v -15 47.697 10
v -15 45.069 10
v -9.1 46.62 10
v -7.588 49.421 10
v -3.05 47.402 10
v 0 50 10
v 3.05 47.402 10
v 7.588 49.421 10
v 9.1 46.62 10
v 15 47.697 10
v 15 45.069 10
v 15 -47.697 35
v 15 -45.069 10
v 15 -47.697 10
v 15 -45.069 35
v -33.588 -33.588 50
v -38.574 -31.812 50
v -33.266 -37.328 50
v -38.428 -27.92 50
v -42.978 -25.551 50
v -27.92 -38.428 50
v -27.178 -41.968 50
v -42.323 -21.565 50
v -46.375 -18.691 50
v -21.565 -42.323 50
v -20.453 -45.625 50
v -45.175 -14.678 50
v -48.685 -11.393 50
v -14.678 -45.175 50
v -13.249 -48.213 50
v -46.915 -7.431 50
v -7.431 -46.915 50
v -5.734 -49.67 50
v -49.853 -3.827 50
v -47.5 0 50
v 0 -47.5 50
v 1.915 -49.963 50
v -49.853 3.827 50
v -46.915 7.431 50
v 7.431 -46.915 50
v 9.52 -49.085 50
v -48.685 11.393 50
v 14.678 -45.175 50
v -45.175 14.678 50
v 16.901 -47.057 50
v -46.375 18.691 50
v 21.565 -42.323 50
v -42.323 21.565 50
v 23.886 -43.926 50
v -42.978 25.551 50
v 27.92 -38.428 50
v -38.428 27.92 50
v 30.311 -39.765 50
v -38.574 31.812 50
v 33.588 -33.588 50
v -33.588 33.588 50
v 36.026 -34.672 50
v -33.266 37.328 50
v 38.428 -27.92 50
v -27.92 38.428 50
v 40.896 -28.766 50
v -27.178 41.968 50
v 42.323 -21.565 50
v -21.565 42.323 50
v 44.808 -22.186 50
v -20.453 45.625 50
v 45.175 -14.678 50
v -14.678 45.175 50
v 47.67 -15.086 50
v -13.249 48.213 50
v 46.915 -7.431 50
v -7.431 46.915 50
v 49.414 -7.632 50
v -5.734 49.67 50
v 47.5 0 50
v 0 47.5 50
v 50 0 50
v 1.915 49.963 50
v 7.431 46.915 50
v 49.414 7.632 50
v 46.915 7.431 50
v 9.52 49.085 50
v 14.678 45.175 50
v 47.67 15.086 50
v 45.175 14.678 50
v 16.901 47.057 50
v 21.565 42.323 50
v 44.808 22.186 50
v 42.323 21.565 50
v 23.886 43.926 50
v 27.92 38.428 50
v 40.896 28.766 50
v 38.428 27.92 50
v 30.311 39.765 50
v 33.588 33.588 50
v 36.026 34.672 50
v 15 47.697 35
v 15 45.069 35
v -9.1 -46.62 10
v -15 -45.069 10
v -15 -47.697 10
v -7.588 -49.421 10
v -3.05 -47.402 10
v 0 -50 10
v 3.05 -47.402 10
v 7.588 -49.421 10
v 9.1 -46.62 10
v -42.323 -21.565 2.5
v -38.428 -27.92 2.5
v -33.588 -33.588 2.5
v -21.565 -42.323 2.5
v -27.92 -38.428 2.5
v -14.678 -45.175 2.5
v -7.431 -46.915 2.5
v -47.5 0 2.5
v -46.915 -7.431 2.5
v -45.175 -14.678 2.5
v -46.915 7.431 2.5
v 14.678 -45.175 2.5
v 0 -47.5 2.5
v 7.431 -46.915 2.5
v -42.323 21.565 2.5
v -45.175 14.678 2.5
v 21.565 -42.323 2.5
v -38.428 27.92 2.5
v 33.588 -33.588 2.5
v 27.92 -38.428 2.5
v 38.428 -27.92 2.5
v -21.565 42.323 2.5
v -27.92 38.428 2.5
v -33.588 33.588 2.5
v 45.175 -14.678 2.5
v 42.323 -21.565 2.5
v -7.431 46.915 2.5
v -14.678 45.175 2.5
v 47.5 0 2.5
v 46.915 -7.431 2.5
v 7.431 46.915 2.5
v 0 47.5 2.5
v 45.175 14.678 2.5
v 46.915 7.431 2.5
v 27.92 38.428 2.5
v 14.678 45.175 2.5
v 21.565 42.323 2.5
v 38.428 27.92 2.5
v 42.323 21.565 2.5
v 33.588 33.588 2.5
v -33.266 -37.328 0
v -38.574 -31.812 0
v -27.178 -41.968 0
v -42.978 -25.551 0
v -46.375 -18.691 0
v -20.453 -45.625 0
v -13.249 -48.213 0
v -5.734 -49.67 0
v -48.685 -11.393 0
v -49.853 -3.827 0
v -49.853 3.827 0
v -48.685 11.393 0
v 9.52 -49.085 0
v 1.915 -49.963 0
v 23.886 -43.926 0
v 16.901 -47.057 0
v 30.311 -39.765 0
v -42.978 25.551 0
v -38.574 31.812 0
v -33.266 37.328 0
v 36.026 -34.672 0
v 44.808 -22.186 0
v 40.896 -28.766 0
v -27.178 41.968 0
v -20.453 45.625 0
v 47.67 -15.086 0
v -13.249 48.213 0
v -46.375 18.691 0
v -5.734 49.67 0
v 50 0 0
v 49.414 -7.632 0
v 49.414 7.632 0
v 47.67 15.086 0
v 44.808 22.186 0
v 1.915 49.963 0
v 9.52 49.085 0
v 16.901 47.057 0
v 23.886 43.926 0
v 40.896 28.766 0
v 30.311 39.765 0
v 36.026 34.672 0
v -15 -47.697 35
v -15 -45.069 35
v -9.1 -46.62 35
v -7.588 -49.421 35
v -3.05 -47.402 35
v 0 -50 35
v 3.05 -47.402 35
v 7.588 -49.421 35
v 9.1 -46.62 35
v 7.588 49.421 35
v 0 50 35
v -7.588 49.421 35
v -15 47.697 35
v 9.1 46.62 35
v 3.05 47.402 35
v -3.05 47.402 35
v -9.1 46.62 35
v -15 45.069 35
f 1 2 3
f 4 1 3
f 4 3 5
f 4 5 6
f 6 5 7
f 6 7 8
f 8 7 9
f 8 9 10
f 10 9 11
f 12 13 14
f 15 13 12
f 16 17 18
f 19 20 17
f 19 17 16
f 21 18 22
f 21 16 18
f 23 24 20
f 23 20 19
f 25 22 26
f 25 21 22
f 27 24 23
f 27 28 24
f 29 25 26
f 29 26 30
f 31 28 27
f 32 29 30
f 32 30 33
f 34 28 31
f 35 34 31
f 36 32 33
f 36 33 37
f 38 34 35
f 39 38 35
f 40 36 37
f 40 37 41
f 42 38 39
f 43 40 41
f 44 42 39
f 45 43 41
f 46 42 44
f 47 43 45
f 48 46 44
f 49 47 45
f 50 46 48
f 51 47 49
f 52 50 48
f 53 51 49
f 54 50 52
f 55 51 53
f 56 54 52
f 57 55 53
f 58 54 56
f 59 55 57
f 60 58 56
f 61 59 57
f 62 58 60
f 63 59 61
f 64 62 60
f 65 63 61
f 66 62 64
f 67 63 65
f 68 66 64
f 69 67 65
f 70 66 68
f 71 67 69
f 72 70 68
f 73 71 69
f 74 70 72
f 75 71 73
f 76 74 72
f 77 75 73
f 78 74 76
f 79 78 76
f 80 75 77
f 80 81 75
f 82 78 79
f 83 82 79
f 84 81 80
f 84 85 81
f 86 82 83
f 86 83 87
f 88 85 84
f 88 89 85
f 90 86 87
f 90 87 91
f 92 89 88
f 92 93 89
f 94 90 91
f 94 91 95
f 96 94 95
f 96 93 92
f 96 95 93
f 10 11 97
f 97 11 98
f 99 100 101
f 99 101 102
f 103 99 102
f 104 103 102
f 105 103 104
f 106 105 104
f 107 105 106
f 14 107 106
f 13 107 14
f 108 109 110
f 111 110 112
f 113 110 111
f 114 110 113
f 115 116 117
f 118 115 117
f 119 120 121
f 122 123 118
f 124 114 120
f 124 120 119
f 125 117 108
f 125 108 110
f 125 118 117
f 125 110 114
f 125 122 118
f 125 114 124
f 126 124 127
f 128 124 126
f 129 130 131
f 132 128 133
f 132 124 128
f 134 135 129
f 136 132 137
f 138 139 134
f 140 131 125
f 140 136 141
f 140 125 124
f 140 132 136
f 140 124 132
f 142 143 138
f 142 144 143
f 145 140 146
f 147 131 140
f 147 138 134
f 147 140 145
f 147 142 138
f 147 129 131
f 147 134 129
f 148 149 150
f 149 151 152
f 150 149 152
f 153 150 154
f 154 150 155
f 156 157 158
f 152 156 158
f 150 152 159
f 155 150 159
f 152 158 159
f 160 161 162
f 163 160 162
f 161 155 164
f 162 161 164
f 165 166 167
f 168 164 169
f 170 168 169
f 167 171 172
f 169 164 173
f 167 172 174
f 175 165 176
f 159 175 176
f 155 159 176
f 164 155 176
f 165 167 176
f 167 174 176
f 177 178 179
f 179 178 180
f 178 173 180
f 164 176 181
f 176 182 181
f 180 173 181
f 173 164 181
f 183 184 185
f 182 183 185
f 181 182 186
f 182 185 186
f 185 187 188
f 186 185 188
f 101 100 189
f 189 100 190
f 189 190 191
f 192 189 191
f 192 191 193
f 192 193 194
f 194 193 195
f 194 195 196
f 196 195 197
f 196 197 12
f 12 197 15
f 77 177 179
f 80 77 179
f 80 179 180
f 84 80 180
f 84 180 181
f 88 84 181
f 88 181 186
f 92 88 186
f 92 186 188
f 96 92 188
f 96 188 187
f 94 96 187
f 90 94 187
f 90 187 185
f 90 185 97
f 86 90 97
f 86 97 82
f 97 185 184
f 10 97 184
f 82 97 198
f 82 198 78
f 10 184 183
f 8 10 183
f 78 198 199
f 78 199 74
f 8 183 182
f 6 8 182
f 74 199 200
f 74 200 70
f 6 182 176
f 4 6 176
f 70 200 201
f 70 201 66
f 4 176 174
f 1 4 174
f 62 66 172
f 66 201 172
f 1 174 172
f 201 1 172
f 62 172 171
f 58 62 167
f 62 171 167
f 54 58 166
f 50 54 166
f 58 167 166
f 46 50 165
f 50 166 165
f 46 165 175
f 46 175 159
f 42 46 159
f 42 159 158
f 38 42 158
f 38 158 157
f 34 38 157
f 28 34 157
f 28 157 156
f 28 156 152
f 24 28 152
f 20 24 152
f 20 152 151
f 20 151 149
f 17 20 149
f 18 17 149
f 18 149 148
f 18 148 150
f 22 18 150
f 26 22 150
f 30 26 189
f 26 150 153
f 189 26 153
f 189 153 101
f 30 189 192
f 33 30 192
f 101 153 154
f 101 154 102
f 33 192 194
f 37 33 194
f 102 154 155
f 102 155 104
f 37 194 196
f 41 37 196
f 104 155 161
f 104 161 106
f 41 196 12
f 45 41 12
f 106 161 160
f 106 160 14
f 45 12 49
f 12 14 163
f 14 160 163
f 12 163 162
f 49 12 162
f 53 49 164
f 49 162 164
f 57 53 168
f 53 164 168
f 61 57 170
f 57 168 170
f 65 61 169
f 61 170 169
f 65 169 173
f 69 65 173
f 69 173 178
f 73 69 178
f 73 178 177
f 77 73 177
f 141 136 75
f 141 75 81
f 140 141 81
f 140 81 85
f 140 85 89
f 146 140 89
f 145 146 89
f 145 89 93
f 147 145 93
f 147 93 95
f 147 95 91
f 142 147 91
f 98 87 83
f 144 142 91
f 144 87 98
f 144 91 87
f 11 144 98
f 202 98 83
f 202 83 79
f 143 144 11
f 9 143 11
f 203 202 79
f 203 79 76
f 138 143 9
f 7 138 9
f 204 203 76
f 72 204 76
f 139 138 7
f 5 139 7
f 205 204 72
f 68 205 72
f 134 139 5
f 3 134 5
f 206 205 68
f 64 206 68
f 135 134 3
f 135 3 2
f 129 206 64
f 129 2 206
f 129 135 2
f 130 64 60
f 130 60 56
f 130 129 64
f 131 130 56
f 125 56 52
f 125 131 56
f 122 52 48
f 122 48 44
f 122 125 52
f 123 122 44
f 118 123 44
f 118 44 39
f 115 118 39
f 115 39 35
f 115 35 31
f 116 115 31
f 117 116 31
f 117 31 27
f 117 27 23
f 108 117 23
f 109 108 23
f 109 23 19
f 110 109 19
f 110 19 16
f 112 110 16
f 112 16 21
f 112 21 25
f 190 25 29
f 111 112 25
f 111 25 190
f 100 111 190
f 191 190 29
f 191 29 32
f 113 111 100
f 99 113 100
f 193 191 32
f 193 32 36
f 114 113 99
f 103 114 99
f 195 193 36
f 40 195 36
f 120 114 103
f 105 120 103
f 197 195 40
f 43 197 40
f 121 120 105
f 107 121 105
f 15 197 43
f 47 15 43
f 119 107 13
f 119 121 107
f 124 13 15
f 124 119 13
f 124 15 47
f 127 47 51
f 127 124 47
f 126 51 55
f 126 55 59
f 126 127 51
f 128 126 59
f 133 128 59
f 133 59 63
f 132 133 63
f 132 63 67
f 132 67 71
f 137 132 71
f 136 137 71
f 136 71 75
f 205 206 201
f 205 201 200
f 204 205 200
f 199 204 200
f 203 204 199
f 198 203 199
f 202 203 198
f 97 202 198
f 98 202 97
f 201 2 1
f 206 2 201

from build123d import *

# Parameters (mm, degrees)
F0_R          = 50
F1_DEPTH      = 50
F2_T          = -2.5
F3_W          = 30
F3_H          = 25
F4_DEPTH      = 50.001
F4_DEPTH_BACK = 50.001


with BuildPart() as f1:
    # F0 (on Top) → F1 (new body)
    with BuildSketch(Plane.XY):
        Circle(F0_R)
    extrude(amount=F1_DEPTH)

    # F2
    f2_openings = [f1.faces().sort_by_distance(p)[0] for p in [
        (0, 0, 50),
    ]]
    offset(amount=F2_T, openings=f2_openings)

    # F3 (on Front) → F4 (cut, two sides)
    with BuildSketch(Plane.XZ) as f4_sk:
        with Locations((0, 22.5)):
            Rectangle(F3_W, F3_H)
    extrude(amount=F4_DEPTH, mode=Mode.SUBTRACT)
    extrude(f4_sk.sketch, amount=-F4_DEPTH_BACK, mode=Mode.SUBTRACT)


solid = f1.part
